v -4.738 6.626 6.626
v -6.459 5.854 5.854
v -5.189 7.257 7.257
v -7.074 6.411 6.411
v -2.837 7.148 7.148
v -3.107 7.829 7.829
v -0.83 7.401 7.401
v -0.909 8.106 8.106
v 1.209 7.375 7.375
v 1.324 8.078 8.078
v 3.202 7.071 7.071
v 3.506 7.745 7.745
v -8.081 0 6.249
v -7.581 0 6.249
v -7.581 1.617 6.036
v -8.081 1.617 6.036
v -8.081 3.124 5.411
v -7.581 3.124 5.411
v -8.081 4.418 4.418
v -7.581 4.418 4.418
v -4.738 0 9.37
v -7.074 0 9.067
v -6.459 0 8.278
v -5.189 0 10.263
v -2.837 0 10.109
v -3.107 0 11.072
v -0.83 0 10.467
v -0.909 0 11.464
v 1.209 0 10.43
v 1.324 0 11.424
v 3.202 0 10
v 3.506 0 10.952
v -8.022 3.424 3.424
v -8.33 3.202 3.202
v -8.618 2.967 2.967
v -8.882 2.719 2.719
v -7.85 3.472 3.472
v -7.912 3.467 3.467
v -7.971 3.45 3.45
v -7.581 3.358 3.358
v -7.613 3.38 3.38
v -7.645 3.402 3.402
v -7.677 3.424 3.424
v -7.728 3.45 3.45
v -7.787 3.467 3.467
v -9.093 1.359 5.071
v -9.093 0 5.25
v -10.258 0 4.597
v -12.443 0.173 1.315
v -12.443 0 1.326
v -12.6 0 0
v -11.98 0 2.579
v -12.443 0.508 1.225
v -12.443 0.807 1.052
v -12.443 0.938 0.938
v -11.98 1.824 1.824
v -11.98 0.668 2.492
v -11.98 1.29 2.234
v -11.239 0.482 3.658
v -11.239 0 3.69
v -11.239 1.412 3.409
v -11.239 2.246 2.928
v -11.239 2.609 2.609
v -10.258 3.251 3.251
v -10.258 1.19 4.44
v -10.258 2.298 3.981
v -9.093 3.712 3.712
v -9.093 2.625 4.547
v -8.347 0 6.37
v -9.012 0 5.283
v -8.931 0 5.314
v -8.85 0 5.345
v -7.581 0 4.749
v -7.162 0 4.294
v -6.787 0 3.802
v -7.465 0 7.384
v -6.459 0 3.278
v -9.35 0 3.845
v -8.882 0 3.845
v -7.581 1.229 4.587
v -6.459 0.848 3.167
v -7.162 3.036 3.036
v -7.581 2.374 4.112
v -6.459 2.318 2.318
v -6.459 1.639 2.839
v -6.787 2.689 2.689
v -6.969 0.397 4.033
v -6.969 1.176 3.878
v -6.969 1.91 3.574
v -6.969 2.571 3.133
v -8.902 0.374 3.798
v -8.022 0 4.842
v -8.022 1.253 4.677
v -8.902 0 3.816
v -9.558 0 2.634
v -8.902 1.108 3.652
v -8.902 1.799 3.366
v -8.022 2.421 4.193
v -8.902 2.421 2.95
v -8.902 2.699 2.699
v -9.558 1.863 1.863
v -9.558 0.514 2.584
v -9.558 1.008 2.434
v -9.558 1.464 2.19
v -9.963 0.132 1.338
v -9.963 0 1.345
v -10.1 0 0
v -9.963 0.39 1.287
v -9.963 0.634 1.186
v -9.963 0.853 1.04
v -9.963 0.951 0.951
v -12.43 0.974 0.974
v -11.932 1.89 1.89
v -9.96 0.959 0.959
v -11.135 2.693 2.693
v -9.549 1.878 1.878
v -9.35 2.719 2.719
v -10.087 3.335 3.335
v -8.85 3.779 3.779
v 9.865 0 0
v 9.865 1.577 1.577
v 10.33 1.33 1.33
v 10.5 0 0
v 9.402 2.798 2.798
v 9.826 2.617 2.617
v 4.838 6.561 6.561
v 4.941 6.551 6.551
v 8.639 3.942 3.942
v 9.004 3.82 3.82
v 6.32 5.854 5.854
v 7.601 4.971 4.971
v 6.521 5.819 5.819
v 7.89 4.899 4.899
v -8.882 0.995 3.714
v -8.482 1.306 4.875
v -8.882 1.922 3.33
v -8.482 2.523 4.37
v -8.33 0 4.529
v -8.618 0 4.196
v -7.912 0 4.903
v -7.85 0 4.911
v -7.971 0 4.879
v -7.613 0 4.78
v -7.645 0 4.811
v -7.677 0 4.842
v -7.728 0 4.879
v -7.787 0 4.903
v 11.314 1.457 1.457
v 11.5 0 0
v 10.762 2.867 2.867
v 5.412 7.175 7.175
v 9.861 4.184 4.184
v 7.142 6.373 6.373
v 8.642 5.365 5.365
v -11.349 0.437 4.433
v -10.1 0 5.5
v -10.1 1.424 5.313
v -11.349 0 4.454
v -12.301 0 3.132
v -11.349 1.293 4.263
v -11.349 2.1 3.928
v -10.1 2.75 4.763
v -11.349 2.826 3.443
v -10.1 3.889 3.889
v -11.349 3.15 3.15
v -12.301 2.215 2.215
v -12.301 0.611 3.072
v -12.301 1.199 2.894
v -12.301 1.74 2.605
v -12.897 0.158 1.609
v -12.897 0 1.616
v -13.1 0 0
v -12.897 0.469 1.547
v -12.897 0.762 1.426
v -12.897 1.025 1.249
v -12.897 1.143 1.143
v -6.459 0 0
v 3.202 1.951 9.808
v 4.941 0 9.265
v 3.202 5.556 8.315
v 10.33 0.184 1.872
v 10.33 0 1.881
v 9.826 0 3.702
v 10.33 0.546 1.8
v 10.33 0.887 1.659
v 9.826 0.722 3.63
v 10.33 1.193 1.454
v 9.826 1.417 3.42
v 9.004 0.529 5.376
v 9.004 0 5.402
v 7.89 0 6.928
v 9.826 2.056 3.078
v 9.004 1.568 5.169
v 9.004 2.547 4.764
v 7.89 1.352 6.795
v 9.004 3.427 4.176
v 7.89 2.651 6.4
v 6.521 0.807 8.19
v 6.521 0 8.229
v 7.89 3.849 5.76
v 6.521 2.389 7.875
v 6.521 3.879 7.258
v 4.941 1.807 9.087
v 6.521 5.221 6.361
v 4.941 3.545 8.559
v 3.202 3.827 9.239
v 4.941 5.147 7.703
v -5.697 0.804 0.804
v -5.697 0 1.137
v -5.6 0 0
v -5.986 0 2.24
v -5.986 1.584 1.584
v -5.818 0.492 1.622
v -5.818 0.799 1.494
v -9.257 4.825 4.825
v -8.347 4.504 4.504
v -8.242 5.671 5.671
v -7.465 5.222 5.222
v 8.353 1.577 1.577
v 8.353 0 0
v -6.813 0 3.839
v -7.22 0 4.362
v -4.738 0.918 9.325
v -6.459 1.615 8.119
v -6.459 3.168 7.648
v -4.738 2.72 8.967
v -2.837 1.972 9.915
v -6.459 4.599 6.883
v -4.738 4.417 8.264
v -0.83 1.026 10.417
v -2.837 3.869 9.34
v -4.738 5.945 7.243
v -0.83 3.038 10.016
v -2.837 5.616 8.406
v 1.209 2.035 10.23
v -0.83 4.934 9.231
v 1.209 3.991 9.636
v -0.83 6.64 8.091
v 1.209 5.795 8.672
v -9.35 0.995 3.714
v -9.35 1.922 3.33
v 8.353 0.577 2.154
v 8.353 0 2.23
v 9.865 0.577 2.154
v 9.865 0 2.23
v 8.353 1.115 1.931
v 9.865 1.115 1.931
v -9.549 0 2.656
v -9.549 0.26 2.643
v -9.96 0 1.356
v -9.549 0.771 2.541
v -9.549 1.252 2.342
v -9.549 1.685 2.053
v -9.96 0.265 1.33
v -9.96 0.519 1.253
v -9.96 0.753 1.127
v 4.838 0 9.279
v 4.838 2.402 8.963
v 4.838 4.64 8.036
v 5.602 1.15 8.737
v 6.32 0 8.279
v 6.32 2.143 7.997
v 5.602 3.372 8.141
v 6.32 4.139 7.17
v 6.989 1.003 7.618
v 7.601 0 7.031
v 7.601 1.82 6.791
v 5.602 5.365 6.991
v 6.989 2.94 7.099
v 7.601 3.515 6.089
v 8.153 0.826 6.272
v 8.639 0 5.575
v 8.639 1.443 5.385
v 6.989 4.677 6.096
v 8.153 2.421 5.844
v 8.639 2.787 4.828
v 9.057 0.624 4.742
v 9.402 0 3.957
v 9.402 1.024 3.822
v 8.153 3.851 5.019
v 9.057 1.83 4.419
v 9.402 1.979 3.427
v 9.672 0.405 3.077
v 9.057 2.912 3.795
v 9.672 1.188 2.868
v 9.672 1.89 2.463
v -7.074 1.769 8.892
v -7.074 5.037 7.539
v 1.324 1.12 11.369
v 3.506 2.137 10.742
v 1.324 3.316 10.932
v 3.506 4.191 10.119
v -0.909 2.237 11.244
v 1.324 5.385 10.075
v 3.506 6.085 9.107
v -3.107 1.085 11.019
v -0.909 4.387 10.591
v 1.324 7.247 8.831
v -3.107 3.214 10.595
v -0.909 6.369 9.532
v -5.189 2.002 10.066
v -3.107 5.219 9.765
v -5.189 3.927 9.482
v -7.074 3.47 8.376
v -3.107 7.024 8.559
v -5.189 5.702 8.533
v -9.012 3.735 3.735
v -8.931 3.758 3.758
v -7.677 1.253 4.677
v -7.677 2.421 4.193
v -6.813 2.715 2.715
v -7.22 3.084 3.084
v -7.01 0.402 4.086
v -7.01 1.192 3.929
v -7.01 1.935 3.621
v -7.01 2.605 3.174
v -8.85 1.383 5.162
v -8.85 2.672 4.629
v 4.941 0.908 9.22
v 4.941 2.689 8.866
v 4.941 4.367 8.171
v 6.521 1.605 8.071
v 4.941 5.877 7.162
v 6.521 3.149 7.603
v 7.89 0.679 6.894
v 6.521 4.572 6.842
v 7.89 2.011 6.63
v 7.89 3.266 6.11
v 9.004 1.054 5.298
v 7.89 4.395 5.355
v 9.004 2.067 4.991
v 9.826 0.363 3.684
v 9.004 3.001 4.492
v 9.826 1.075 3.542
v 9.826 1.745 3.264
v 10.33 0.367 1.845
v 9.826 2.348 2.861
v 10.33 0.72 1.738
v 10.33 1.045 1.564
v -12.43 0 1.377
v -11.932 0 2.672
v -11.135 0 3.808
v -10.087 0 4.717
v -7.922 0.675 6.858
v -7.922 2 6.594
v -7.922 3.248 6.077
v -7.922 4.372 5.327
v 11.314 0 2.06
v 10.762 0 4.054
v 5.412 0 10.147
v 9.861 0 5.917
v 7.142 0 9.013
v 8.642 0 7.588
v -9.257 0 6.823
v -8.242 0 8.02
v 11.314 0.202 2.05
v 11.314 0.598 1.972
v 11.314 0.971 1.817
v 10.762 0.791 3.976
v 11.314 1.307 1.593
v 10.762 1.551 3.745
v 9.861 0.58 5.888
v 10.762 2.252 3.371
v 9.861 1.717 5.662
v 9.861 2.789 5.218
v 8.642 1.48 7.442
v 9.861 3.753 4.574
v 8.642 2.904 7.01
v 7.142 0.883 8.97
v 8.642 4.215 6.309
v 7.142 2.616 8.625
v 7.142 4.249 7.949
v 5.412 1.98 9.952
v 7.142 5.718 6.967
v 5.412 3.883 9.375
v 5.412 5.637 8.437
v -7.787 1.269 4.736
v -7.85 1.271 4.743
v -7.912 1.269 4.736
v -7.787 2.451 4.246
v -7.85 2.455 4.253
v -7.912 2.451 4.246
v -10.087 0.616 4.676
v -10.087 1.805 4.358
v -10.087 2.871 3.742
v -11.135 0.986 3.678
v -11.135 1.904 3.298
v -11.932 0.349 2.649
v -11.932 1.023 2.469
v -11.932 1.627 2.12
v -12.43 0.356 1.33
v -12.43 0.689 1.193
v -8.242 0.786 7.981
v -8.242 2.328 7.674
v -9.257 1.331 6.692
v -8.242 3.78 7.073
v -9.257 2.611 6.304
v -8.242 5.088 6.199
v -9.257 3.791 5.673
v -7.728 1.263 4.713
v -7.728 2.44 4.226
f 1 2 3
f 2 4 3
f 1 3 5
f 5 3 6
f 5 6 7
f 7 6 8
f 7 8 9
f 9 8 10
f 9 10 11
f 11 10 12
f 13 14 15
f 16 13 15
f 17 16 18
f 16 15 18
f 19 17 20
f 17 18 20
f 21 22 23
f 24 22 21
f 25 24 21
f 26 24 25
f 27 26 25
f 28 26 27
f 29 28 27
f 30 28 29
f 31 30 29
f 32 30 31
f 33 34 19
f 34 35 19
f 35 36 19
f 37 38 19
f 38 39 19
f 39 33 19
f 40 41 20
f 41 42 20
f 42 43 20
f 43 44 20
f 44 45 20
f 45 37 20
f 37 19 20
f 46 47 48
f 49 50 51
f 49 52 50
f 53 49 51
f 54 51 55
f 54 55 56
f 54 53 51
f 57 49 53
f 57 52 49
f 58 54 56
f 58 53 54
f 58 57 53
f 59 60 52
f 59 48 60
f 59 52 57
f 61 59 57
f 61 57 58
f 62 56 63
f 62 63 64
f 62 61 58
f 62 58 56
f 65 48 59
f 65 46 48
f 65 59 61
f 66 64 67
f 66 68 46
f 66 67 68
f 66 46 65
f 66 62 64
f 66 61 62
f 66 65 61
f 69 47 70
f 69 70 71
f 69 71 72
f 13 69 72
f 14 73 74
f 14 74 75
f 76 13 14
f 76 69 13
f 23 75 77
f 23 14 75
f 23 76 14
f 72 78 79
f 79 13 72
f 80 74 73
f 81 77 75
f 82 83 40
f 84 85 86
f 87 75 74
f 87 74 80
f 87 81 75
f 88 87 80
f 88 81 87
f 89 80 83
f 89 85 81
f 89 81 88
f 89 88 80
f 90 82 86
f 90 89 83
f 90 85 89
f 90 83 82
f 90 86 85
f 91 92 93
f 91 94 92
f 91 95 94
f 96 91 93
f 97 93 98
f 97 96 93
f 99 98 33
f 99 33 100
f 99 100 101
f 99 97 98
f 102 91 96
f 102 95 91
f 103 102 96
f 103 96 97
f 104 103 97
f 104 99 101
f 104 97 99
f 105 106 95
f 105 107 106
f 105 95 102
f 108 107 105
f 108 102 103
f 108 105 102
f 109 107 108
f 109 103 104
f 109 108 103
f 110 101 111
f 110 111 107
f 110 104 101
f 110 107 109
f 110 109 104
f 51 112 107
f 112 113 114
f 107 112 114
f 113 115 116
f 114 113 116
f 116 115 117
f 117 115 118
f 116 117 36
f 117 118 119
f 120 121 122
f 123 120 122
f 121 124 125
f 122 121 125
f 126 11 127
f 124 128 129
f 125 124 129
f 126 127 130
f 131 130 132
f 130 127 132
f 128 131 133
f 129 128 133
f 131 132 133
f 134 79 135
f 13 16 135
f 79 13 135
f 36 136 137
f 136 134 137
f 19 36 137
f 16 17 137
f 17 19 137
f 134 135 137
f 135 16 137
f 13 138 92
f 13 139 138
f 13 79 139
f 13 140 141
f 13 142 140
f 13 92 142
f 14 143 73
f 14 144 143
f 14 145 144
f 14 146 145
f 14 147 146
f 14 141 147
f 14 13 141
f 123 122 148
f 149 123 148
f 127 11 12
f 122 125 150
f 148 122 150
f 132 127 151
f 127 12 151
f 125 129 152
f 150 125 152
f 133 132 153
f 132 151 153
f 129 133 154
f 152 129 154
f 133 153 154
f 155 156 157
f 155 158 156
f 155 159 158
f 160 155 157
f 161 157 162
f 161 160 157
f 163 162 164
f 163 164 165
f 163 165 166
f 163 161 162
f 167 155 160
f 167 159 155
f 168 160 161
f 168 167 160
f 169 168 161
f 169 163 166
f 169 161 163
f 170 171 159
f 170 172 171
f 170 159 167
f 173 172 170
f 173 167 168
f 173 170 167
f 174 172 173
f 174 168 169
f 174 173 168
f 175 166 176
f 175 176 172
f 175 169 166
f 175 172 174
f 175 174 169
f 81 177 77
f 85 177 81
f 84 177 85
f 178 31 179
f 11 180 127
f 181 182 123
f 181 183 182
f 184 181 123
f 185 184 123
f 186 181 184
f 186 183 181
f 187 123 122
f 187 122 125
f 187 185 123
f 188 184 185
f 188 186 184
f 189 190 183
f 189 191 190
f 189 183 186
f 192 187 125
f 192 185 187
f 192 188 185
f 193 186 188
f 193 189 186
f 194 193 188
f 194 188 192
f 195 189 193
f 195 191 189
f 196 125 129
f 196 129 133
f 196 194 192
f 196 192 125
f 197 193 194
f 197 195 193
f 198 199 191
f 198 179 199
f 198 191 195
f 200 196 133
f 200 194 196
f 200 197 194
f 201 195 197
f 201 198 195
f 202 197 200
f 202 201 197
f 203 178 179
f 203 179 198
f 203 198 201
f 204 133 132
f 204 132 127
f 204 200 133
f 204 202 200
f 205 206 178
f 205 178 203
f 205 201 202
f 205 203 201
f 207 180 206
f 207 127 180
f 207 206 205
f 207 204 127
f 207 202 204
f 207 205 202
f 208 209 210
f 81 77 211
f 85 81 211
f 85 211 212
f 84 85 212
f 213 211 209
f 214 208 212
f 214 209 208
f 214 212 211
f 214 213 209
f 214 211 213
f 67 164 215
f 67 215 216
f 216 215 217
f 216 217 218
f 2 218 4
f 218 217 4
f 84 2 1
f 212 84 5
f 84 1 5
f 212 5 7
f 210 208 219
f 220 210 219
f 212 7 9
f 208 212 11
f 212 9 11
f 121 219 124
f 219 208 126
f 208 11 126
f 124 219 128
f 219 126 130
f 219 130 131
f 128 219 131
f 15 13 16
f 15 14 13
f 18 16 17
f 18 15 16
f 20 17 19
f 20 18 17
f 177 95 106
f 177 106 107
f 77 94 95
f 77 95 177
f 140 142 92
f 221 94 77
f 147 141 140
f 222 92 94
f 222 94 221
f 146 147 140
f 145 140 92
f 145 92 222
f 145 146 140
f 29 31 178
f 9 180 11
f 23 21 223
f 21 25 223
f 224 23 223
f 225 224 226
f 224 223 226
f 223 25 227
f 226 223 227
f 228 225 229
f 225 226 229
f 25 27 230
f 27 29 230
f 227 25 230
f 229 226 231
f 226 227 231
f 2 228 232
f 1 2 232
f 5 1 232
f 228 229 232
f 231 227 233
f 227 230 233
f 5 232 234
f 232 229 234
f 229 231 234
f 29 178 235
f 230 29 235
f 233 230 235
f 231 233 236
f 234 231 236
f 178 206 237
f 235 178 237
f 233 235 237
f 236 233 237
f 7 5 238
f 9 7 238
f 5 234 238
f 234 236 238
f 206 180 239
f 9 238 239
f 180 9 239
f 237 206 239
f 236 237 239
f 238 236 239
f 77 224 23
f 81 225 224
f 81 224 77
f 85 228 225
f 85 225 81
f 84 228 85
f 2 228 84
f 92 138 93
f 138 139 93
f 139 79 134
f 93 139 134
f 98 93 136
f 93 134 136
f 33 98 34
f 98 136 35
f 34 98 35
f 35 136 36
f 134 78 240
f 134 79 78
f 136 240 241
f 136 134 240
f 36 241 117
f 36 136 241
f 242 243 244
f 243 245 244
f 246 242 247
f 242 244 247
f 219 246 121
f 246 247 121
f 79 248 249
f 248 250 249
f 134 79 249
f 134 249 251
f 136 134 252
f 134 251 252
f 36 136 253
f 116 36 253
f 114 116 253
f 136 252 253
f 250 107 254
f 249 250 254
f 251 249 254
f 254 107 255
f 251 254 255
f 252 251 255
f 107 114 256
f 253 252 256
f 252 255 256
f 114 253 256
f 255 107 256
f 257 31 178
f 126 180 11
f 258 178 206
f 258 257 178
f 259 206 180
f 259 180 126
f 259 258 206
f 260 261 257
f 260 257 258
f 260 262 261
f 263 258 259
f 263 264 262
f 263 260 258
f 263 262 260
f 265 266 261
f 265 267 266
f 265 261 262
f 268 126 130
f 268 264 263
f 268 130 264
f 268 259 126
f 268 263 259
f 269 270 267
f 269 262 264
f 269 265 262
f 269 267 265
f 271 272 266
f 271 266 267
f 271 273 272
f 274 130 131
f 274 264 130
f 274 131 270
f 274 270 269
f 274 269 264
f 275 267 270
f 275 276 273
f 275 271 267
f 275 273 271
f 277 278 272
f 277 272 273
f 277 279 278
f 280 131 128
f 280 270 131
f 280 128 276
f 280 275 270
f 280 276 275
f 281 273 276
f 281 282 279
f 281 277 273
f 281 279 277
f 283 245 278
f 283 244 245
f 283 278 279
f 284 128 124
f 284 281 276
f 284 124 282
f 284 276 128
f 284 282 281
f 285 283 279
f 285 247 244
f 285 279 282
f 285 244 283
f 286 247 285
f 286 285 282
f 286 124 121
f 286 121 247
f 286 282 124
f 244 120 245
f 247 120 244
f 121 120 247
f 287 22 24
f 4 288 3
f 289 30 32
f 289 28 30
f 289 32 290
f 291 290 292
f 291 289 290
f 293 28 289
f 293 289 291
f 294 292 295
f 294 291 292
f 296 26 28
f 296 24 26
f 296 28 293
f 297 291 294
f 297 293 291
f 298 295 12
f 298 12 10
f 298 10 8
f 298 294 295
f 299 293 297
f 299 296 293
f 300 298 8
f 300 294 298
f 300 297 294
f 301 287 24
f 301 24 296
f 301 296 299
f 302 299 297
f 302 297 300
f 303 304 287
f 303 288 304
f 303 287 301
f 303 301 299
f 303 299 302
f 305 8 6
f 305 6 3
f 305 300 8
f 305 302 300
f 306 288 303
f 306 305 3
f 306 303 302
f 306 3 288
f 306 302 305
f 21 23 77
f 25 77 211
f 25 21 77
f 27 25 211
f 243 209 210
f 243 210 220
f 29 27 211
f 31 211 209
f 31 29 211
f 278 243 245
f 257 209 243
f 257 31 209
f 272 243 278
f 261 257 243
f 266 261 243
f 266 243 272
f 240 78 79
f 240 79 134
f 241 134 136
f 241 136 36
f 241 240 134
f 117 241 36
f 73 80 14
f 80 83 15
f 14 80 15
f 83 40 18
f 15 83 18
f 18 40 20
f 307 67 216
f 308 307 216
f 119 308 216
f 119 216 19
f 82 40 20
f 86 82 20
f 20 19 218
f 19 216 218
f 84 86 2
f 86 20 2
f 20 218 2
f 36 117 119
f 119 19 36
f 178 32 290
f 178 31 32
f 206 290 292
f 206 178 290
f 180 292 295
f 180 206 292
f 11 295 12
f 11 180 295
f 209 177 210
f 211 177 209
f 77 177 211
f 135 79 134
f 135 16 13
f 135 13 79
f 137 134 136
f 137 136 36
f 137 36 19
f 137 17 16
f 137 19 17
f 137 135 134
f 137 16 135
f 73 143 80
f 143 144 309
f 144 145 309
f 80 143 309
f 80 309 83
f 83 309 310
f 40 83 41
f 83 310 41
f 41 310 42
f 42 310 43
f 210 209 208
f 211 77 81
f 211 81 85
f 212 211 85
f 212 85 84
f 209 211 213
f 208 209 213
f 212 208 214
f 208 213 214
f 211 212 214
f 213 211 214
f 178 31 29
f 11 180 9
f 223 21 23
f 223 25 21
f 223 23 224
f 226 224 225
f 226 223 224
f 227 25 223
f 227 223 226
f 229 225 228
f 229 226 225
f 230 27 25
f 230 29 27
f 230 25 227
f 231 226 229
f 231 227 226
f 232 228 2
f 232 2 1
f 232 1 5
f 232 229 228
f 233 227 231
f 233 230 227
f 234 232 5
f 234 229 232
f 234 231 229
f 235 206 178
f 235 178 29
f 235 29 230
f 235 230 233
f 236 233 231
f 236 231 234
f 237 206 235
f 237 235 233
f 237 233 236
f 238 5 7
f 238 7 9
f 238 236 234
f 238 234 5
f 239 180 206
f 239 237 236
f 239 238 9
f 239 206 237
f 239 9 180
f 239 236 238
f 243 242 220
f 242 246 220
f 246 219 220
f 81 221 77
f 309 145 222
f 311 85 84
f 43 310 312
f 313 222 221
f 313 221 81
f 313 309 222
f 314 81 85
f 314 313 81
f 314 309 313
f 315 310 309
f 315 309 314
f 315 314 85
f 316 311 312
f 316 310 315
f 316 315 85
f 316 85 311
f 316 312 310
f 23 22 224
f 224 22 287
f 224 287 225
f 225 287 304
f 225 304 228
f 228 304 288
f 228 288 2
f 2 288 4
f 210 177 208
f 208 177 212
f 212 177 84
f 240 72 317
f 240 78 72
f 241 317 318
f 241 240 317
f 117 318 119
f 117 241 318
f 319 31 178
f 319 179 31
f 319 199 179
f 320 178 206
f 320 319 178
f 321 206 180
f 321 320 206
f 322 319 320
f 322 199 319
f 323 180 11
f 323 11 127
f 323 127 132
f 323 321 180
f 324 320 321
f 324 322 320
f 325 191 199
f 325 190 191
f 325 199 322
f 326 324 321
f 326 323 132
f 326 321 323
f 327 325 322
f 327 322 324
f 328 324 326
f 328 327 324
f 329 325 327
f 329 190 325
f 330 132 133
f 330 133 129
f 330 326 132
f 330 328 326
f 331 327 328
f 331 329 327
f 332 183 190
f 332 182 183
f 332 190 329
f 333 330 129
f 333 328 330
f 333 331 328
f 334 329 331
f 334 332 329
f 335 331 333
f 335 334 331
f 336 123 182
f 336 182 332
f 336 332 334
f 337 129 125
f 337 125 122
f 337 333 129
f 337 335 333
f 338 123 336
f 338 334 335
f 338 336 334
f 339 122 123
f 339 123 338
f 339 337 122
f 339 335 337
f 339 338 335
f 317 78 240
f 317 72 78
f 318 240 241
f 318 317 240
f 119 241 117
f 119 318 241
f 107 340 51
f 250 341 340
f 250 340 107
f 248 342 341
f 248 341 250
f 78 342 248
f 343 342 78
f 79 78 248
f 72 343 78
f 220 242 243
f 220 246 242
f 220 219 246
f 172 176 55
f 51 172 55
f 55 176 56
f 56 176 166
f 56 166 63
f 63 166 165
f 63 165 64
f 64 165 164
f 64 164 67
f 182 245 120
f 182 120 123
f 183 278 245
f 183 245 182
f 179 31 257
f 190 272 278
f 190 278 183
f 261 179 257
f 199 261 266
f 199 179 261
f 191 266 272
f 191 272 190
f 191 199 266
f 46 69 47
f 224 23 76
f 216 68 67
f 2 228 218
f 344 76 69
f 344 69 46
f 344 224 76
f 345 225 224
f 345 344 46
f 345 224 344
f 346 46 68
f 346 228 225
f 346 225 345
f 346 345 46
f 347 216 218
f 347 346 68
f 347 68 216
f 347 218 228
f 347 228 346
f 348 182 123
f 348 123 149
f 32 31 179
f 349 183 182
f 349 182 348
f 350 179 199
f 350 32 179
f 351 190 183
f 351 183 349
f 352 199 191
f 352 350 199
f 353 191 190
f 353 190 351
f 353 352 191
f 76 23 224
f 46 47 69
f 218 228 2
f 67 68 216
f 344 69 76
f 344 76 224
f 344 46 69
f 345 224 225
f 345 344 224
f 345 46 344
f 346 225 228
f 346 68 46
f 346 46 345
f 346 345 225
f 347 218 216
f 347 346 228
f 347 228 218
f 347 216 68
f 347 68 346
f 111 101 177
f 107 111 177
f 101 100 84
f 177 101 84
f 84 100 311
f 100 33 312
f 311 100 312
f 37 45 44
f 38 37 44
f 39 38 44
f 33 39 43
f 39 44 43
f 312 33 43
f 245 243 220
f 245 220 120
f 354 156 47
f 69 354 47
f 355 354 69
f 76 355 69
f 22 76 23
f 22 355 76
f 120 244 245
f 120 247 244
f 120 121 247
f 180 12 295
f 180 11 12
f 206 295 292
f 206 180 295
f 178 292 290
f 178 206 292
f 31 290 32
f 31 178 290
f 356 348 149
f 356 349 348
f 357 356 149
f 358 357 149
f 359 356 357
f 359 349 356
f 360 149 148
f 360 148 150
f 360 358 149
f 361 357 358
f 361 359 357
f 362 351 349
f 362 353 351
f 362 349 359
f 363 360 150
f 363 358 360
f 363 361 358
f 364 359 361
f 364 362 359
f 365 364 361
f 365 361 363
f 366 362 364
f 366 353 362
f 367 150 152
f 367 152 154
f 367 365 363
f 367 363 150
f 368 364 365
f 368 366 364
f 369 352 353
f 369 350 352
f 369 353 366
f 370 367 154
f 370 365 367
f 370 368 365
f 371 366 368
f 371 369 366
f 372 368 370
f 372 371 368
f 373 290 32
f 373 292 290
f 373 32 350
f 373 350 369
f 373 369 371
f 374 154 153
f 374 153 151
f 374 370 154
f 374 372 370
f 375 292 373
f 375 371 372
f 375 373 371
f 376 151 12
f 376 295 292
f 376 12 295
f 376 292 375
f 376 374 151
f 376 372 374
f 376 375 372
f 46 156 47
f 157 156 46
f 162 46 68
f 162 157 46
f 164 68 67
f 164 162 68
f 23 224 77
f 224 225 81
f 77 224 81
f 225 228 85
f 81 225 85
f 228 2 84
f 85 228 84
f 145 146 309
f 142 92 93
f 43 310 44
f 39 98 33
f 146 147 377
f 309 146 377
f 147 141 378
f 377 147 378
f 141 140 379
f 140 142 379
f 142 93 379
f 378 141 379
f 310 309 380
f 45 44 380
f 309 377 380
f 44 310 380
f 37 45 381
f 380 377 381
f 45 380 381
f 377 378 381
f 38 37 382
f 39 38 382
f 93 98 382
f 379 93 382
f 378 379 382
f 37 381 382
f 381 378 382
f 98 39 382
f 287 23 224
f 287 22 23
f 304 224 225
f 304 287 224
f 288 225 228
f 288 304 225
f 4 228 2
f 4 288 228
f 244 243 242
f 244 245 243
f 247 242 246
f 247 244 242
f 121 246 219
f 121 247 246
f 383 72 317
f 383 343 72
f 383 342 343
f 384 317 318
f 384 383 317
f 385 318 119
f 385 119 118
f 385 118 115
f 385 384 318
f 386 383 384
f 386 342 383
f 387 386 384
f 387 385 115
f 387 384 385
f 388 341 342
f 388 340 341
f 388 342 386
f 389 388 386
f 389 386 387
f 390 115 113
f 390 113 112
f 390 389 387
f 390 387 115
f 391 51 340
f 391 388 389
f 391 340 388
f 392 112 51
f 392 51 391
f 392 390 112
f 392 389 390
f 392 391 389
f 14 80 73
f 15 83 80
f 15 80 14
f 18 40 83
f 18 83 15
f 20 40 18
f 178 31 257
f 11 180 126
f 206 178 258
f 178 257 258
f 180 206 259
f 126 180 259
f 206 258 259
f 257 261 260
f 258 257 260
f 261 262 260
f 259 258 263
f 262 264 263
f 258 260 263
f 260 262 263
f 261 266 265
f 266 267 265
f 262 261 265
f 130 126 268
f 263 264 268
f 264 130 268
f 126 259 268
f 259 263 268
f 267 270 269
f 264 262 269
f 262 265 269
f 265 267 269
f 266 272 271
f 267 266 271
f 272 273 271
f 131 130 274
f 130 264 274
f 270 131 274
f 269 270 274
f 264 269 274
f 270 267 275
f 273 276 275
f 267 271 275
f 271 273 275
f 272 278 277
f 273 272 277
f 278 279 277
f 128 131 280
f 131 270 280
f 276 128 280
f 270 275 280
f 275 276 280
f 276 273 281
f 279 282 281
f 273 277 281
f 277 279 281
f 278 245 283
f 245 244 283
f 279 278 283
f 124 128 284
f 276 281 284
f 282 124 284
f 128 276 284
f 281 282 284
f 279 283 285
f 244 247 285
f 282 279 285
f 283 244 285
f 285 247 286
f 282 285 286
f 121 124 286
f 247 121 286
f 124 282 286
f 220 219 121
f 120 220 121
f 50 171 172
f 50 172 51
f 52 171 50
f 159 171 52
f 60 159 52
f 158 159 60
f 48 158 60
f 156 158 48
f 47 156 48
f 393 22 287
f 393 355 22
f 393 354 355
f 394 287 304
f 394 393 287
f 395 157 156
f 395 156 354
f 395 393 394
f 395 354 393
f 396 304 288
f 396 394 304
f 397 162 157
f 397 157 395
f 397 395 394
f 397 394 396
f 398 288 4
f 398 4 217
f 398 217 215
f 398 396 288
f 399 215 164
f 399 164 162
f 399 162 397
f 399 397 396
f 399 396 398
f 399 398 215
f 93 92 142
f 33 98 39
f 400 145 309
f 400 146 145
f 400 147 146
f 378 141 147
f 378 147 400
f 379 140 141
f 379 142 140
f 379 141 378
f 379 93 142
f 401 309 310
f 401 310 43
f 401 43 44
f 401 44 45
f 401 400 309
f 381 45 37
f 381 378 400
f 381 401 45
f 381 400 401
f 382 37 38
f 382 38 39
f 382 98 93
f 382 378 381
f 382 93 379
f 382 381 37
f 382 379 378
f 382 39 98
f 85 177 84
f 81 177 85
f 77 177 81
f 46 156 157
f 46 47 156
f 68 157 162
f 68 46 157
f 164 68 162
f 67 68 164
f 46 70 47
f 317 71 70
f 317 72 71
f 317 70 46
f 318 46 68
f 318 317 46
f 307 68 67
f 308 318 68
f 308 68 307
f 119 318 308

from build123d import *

# Parameters (mm, degrees)
F1_ANGLE  = 45
F3_ANGLE  = 45
F4_ANGLE  = 45
F6_ANGLE  = 45
F7_ANGLE  = 45
F9_ANGLE  = 45
F10_ANGLE = 45
F11_W     = 1.51221
F11_H     = 2.23
F12_ANGLE = 45
F13_ANGLE = 45
F15_ANGLE = 45
F16_ANGLE = 45
F19_ANGLE = 45
F22_ANGLE = 45
F25_ANGLE = 45
F28_ANGLE = 45
F31_ANGLE = 45
F34_ANGLE = 45


with BuildPart() as f1:
    # F0 (on Front) → F1 (revolve)
    with BuildSketch(Plane.XZ):
        with BuildLine():
            Line((-11.5, 0), (11.5, 0))
            ThreePointArc((11.5, 0), (2.8377537956, 11.1443776585), (-10.0995049384, 5.5))
            ThreePointArc((-10.0995049384, 5.5), (-12.3007384778, 3.1324910215), (-13.0995049384, 0))
            Line((-13.0995049384, 0), (-11.5, 0))
        make_face()
    revolve(axis=Axis((0, 0, 0), (-1, 0, 0)), revolution_arc=F1_ANGLE)

    # F2 (on Front) → F3 (revolve, cut)
    with BuildSketch(Plane.XZ):
        with BuildLine():
            ThreePointArc((11.5, 0), (2.8377537956, 11.1443776585), (-10.0995049384, 5.5))
            Line((-10.0995049384, 5.5), (-9.0932667397, 5.25))
            ThreePointArc((-9.0932667397, 5.25), (2.7175999736, 10.142221176), (10.5, 0))
            Line((10.5, 0), (11.5, 0))
        make_face()
    revolve(axis=Axis((0, 0, 0), (-1, 0, 0)), revolution_arc=F3_ANGLE, mode=Mode.SUBTRACT)

    # F5 (on face) → F6 (revolve, cut)
    with BuildSketch(Plane.XZ):
        with BuildLine():
            ThreePointArc((-12.5995049384, 0), (-11.6423500551, 3.1565885979), (-9.0932667397, 5.25))
            Line((-9.0932667397, 5.25), (-10.0995049384, 5.5))
            ThreePointArc((-10.0995049384, 5.5), (-12.3007384778, 3.1324910215), (-13.0995049384, 0))
            Line((-13.0995049384, 0), (-12.5995049384, 0))
        make_face()
    revolve(axis=Axis((-12.2997524692, 0, 0), (-1, 0, 0)), revolution_arc=F6_ANGLE, mode=Mode.SUBTRACT)

    # F8 (on Front) → F9 (revolve, cut)
    with BuildSketch(Plane.XZ):
        with BuildLine():
            ThreePointArc((3.2015621187, 10), (8.2807192075, 6.1420955145), (10, 0))
            Line((10, 0), (10.5, 0))
            ThreePointArc((10.5, 0), (8.4813442993, 6.1900564518), (3.2015621187, 10))
        make_face()
    revolve(axis=Axis((0, 0, 0), (-1, 0, 0)), revolution_arc=F9_ANGLE, mode=Mode.SUBTRACT)

    # F11 (on face) → F12 (revolve, cut)
    with BuildSketch(Plane.XZ):
        with Locations((9.1086225685, 1.115)):
            Rectangle(F11_W, F11_H)
    revolve(axis=Axis((9.1086225685, 0, 0), (-1, 0, 0)), revolution_arc=F12_ANGLE, mode=Mode.SUBTRACT)

    # F14 (on Front) → F15 (revolve, cut)
    with BuildSketch(Plane.XZ):
        with BuildLine():
            ThreePointArc((10, 0), (9.9947523902, 1.1187845105), (9.8647275685, 2.23))
            Line((9.8647275685, 2.23), (9.8647275685, 0))
            Line((9.8647275685, 0), (10, 0))
        make_face()
    revolve(axis=Axis((9.9323637842, 0, 0), (-1, 0, 0)), revolution_arc=F15_ANGLE, mode=Mode.SUBTRACT)

    # F20 (on Front) → F21 (revolve, cut)
    with BuildSketch(Plane.XZ):
        with BuildLine():
            Line((-9.3495049384, 3.8445862413), (-8.8495049384, 5.3445862413))
            ThreePointArc((-8.8495049384, 5.3445862413), (-11.5684914777, 3.2644717065), (-12.5995049384, 0))
            Line((-12.5995049384, 0), (-8.8495049384, 0))
            Line((-8.8495049384, 0), (-8.8495049384, 3.8445862413))
            Line((-8.8495049384, 3.8445862413), (-9.3495049384, 3.8445862413))
        make_face()
    revolve(axis=Axis((-10.7245049384, 0, 0), (1, 0, 0)), mode=Mode.SUBTRACT)


with BuildPart() as f4:
    # F2 (on Front) → F4 (revolve)
    with BuildSketch(Plane.XZ):
        with BuildLine():
            ThreePointArc((11.5, 0), (2.8377537956, 11.1443776585), (-10.0995049384, 5.5))
            Line((-10.0995049384, 5.5), (-9.0932667397, 5.25))
            ThreePointArc((-9.0932667397, 5.25), (2.7175999736, 10.142221176), (10.5, 0))
            Line((10.5, 0), (11.5, 0))
        make_face()
    revolve(axis=Axis((0, 0, 0), (-1, 0, 0)), revolution_arc=F4_ANGLE)

    # F17 (on Front) → F18 (revolve, cut)
    with BuildSketch(Plane.XZ):
        with BuildLine():
            ThreePointArc((11.5, 0), (9.2890913754, 6.7795856377), (3.5064727967, 10.9523809524))
            Line((3.5064727967, 10.9523809524), (3.2015621187, 10))
            ThreePointArc((3.2015621187, 10), (8.4813442993, 6.1900564518), (10.5, 0))
            Line((10.5, 0), (11.5, 0))
        make_face()
    revolve(axis=Axis((11, 0, 0), (1, 0, 0)), mode=Mode.SUBTRACT)

    # F29 (on Front) → F30 (revolve, cut)
    with BuildSketch(Plane.XZ):
        with BuildLine():
            ThreePointArc((-9.0932667397, 5.25), (-7.9222484154, 6.8911523017), (-6.4591549508, 8.2782436134))
            Line((-6.4591549508, 8.2782436134), (-7.0743125651, 9.066647767))
            ThreePointArc((-7.0743125651, 9.066647767), (-8.7701337495, 7.438733361), (-10.0995049384, 5.5))
            Line((-10.0995049384, 5.5), (-9.0932667397, 5.25))
        make_face()
    revolve(axis=Axis((-7.8495049384, 0, 0), (-1, 0, 0)), mode=Mode.SUBTRACT)


with BuildPart() as f7:
    # F5 (on face) → F7 (revolve)
    with BuildSketch(Plane.XZ):
        with BuildLine():
            ThreePointArc((-12.5995049384, 0), (-11.6423500551, 3.1565885979), (-9.0932667397, 5.25))
            Line((-9.0932667397, 5.25), (-10.0995049384, 5.5))
            ThreePointArc((-10.0995049384, 5.5), (-12.3007384778, 3.1324910215), (-13.0995049384, 0))
            Line((-13.0995049384, 0), (-12.5995049384, 0))
        make_face()
    revolve(axis=Axis((0, 0, 0), (-1, 0, 0)), revolution_arc=F7_ANGLE)


with BuildPart() as f10:
    # F8 (on Front) → F10 (revolve)
    with BuildSketch(Plane.XZ):
        with BuildLine():
            ThreePointArc((3.2015621187, 10), (8.2807192075, 6.1420955145), (10, 0))
            Line((10, 0), (10.5, 0))
            ThreePointArc((10.5, 0), (8.4813442993, 6.1900564518), (3.2015621187, 10))
        make_face()
    revolve(axis=Axis((10.25, 0, 0), (-1, 0, 0)), revolution_arc=F10_ANGLE)

    # F14 (on Front) → F16 (revolve)
    with BuildSketch(Plane.XZ):
        with BuildLine():
            ThreePointArc((10, 0), (9.9947523902, 1.1187845105), (9.8647275685, 2.23))
            Line((9.8647275685, 2.23), (9.8647275685, 0))
            Line((9.8647275685, 0), (10, 0))
        make_face()
    revolve(axis=Axis((0, 0, 0), (-1, 0, 0)), revolution_arc=F16_ANGLE)


with BuildPart() as f13:
    # F11 (on face) → F13 (revolve)
    with BuildSketch(Plane.XZ):
        with Locations((9.1086225685, 1.115)):
            Rectangle(F11_W, F11_H)
    revolve(axis=Axis((0, 0, 0), (-1, 0, 0)), revolution_arc=F13_ANGLE)


with BuildPart() as f19:
    # F17 (on Front) → F19 (revolve)
    with BuildSketch(Plane.XZ):
        with BuildLine():
            ThreePointArc((11.5, 0), (9.2890913754, 6.7795856377), (3.5064727967, 10.9523809524))
            Line((3.5064727967, 10.9523809524), (3.2015621187, 10))
            ThreePointArc((3.2015621187, 10), (8.4813442993, 6.1900564518), (10.5, 0))
            Line((10.5, 0), (11.5, 0))
        make_face()
    revolve(axis=Axis((0, 0, 0), (-1, 0, 0)), revolution_arc=F19_ANGLE)


with BuildPart() as f22:
    # F20 (on Front) → F22 (revolve)
    with BuildSketch(Plane.XZ):
        with BuildLine():
            Line((-9.3495049384, 3.8445862413), (-8.8495049384, 5.3445862413))
            ThreePointArc((-8.8495049384, 5.3445862413), (-11.5684914777, 3.2644717065), (-12.5995049384, 0))
            Line((-12.5995049384, 0), (-8.8495049384, 0))
            Line((-8.8495049384, 0), (-8.8495049384, 3.8445862413))
            Line((-8.8495049384, 3.8445862413), (-9.3495049384, 3.8445862413))
        make_face()
    revolve(axis=Axis((0, 0, 0), (-1, 0, 0)), revolution_arc=F22_ANGLE)


with BuildPart() as f24_tool:
    # F23 (on Front) → F24 (revolve)
    with BuildSketch(Plane.XZ):
        with BuildLine():
            Line((-10.0995049384, 0), (-5.5995049384, 0))
            ThreePointArc((-5.5995049384, 0), (-6.1408791354, 2.6344401261), (-7.6772587181, 4.8419044128))
            ThreePointArc((-7.6772587181, 4.8419044128), (-7.8495049384, 4.9107104847), (-8.0217511587, 4.8419044128))
            ThreePointArc((-8.0217511587, 4.8419044128), (-9.5581307413, 2.6344401261), (-10.0995049384, 0))
        make_face()
    revolve(axis=Axis((0, 0, 0), (-1, 0, 0)))


with BuildPart() as f1_1:
    add(f1.part)

    # F24: cut by f24_tool
    add(f24_tool.part, mode=Mode.SUBTRACT)

    # F26 (on Front) → F27 (revolve, cut)
    with BuildSketch(Plane.XZ):
        with BuildLine():
            Line((-8.8495049384, 5.3445862413), (-9.3495049384, 3.8445862413))
            Line((-9.3495049384, 3.8445862413), (-8.8823713109, 3.8445862413))
            Line((-8.8823713109, 3.8445862413), (-8.0810395972, 6.2485813822))
            Line((-8.0810395972, 6.2485813822), (-7.5810395972, 6.2485813822))
            Line((-7.5810395972, 6.2485813822), (-7.5810395972, 4.7485813822))
            ThreePointArc((-7.5810395972, 4.7485813822), (-6.9689696113, 4.0524234931), (-6.4591549508, 3.2782436134))
            Line((-6.4591549508, 3.2782436134), (-6.4591549508, 8.2782436134))
            ThreePointArc((-6.4591549508, 8.2782436134), (-7.9222484154, 6.8911523017), (-9.0932667397, 5.25))
            ThreePointArc((-9.0932667397, 5.25), (-8.9719298306, 5.298695062), (-8.8495049384, 5.3445862413))
        make_face()
    revolve(axis=Axis((-7.8495049384, 0, 0), (-1, 0, 0)), mode=Mode.SUBTRACT)


with BuildPart() as f22_1:
    add(f22.part)

    # F24: cut by f24_tool
    add(f24_tool.part, mode=Mode.SUBTRACT)


with BuildPart() as f25:
    # F23 (on Front) → F25 (revolve)
    with BuildSketch(Plane.XZ):
        with BuildLine():
            Line((-10.0995049384, 0), (-5.5995049384, 0))
            ThreePointArc((-5.5995049384, 0), (-6.1408791354, 2.6344401261), (-7.6772587181, 4.8419044128))
            ThreePointArc((-7.6772587181, 4.8419044128), (-7.8495049384, 4.9107104847), (-8.0217511587, 4.8419044128))
            ThreePointArc((-8.0217511587, 4.8419044128), (-9.5581307413, 2.6344401261), (-10.0995049384, 0))
        make_face()
    revolve(axis=Axis((0, 0, 0), (-1, 0, 0)), revolution_arc=F25_ANGLE)

    # F32 (on Front) → F33 (revolve, cut)
    with BuildSketch(Plane.XZ):
        with BuildLine():
            Line((-6.4591549508, 3.2782436134), (-6.4591549508, 0))
            Line((-6.4591549508, 0), (-5.5995049384, 0))
            ThreePointArc((-5.5995049384, 0), (-5.8179901834, 1.6945411866), (-6.4591549508, 3.2782436134))
        make_face()
    revolve(axis=Axis((-6.0293299446, 0, 0), (1, 0, 0)), mode=Mode.SUBTRACT)


with BuildPart() as f28:
    # F26 (on Front) → F28 (revolve)
    with BuildSketch(Plane.XZ):
        with BuildLine():
            Line((-8.8495049384, 5.3445862413), (-9.3495049384, 3.8445862413))
            Line((-9.3495049384, 3.8445862413), (-8.8823713109, 3.8445862413))
            Line((-8.8823713109, 3.8445862413), (-8.0810395972, 6.2485813822))
            Line((-8.0810395972, 6.2485813822), (-7.5810395972, 6.2485813822))
            Line((-7.5810395972, 6.2485813822), (-7.5810395972, 4.7485813822))
            ThreePointArc((-7.5810395972, 4.7485813822), (-6.9689696113, 4.0524234931), (-6.4591549508, 3.2782436134))
            Line((-6.4591549508, 3.2782436134), (-6.4591549508, 8.2782436134))
            ThreePointArc((-6.4591549508, 8.2782436134), (-7.9222484154, 6.8911523017), (-9.0932667397, 5.25))
            ThreePointArc((-9.0932667397, 5.25), (-8.9719298306, 5.298695062), (-8.8495049384, 5.3445862413))
        make_face()
    revolve(axis=Axis((-7.8495049384, 0, 0), (-1, 0, 0)), revolution_arc=F28_ANGLE)


with BuildPart() as f31:
    # F29 (on Front) → F31 (revolve)
    with BuildSketch(Plane.XZ):
        with BuildLine():
            ThreePointArc((-9.0932667397, 5.25), (-7.9222484154, 6.8911523017), (-6.4591549508, 8.2782436134))
            Line((-6.4591549508, 8.2782436134), (-7.0743125651, 9.066647767))
            ThreePointArc((-7.0743125651, 9.066647767), (-8.7701337495, 7.438733361), (-10.0995049384, 5.5))
            Line((-10.0995049384, 5.5), (-9.0932667397, 5.25))
        make_face()
    revolve(axis=Axis((-7.8495049384, 0, 0), (-1, 0, 0)), revolution_arc=F31_ANGLE)


with BuildPart() as f34:
    # F32 (on Front) → F34 (revolve)
    with BuildSketch(Plane.XZ):
        with BuildLine():
            Line((-6.4591549508, 3.2782436134), (-6.4591549508, 0))
            Line((-6.4591549508, 0), (-5.5995049384, 0))
            ThreePointArc((-5.5995049384, 0), (-5.8179901834, 1.6945411866), (-6.4591549508, 3.2782436134))
        make_face()
    revolve(axis=Axis((-7.8495049384, 0, 0), (-1, 0, 0)), revolution_arc=F34_ANGLE)


solid = Compound([f4.part, f7.part, f10.part, f13.part, f19.part, f1_1.part, f22_1.part, f25.part, f28.part, f31.part, f34.part])
